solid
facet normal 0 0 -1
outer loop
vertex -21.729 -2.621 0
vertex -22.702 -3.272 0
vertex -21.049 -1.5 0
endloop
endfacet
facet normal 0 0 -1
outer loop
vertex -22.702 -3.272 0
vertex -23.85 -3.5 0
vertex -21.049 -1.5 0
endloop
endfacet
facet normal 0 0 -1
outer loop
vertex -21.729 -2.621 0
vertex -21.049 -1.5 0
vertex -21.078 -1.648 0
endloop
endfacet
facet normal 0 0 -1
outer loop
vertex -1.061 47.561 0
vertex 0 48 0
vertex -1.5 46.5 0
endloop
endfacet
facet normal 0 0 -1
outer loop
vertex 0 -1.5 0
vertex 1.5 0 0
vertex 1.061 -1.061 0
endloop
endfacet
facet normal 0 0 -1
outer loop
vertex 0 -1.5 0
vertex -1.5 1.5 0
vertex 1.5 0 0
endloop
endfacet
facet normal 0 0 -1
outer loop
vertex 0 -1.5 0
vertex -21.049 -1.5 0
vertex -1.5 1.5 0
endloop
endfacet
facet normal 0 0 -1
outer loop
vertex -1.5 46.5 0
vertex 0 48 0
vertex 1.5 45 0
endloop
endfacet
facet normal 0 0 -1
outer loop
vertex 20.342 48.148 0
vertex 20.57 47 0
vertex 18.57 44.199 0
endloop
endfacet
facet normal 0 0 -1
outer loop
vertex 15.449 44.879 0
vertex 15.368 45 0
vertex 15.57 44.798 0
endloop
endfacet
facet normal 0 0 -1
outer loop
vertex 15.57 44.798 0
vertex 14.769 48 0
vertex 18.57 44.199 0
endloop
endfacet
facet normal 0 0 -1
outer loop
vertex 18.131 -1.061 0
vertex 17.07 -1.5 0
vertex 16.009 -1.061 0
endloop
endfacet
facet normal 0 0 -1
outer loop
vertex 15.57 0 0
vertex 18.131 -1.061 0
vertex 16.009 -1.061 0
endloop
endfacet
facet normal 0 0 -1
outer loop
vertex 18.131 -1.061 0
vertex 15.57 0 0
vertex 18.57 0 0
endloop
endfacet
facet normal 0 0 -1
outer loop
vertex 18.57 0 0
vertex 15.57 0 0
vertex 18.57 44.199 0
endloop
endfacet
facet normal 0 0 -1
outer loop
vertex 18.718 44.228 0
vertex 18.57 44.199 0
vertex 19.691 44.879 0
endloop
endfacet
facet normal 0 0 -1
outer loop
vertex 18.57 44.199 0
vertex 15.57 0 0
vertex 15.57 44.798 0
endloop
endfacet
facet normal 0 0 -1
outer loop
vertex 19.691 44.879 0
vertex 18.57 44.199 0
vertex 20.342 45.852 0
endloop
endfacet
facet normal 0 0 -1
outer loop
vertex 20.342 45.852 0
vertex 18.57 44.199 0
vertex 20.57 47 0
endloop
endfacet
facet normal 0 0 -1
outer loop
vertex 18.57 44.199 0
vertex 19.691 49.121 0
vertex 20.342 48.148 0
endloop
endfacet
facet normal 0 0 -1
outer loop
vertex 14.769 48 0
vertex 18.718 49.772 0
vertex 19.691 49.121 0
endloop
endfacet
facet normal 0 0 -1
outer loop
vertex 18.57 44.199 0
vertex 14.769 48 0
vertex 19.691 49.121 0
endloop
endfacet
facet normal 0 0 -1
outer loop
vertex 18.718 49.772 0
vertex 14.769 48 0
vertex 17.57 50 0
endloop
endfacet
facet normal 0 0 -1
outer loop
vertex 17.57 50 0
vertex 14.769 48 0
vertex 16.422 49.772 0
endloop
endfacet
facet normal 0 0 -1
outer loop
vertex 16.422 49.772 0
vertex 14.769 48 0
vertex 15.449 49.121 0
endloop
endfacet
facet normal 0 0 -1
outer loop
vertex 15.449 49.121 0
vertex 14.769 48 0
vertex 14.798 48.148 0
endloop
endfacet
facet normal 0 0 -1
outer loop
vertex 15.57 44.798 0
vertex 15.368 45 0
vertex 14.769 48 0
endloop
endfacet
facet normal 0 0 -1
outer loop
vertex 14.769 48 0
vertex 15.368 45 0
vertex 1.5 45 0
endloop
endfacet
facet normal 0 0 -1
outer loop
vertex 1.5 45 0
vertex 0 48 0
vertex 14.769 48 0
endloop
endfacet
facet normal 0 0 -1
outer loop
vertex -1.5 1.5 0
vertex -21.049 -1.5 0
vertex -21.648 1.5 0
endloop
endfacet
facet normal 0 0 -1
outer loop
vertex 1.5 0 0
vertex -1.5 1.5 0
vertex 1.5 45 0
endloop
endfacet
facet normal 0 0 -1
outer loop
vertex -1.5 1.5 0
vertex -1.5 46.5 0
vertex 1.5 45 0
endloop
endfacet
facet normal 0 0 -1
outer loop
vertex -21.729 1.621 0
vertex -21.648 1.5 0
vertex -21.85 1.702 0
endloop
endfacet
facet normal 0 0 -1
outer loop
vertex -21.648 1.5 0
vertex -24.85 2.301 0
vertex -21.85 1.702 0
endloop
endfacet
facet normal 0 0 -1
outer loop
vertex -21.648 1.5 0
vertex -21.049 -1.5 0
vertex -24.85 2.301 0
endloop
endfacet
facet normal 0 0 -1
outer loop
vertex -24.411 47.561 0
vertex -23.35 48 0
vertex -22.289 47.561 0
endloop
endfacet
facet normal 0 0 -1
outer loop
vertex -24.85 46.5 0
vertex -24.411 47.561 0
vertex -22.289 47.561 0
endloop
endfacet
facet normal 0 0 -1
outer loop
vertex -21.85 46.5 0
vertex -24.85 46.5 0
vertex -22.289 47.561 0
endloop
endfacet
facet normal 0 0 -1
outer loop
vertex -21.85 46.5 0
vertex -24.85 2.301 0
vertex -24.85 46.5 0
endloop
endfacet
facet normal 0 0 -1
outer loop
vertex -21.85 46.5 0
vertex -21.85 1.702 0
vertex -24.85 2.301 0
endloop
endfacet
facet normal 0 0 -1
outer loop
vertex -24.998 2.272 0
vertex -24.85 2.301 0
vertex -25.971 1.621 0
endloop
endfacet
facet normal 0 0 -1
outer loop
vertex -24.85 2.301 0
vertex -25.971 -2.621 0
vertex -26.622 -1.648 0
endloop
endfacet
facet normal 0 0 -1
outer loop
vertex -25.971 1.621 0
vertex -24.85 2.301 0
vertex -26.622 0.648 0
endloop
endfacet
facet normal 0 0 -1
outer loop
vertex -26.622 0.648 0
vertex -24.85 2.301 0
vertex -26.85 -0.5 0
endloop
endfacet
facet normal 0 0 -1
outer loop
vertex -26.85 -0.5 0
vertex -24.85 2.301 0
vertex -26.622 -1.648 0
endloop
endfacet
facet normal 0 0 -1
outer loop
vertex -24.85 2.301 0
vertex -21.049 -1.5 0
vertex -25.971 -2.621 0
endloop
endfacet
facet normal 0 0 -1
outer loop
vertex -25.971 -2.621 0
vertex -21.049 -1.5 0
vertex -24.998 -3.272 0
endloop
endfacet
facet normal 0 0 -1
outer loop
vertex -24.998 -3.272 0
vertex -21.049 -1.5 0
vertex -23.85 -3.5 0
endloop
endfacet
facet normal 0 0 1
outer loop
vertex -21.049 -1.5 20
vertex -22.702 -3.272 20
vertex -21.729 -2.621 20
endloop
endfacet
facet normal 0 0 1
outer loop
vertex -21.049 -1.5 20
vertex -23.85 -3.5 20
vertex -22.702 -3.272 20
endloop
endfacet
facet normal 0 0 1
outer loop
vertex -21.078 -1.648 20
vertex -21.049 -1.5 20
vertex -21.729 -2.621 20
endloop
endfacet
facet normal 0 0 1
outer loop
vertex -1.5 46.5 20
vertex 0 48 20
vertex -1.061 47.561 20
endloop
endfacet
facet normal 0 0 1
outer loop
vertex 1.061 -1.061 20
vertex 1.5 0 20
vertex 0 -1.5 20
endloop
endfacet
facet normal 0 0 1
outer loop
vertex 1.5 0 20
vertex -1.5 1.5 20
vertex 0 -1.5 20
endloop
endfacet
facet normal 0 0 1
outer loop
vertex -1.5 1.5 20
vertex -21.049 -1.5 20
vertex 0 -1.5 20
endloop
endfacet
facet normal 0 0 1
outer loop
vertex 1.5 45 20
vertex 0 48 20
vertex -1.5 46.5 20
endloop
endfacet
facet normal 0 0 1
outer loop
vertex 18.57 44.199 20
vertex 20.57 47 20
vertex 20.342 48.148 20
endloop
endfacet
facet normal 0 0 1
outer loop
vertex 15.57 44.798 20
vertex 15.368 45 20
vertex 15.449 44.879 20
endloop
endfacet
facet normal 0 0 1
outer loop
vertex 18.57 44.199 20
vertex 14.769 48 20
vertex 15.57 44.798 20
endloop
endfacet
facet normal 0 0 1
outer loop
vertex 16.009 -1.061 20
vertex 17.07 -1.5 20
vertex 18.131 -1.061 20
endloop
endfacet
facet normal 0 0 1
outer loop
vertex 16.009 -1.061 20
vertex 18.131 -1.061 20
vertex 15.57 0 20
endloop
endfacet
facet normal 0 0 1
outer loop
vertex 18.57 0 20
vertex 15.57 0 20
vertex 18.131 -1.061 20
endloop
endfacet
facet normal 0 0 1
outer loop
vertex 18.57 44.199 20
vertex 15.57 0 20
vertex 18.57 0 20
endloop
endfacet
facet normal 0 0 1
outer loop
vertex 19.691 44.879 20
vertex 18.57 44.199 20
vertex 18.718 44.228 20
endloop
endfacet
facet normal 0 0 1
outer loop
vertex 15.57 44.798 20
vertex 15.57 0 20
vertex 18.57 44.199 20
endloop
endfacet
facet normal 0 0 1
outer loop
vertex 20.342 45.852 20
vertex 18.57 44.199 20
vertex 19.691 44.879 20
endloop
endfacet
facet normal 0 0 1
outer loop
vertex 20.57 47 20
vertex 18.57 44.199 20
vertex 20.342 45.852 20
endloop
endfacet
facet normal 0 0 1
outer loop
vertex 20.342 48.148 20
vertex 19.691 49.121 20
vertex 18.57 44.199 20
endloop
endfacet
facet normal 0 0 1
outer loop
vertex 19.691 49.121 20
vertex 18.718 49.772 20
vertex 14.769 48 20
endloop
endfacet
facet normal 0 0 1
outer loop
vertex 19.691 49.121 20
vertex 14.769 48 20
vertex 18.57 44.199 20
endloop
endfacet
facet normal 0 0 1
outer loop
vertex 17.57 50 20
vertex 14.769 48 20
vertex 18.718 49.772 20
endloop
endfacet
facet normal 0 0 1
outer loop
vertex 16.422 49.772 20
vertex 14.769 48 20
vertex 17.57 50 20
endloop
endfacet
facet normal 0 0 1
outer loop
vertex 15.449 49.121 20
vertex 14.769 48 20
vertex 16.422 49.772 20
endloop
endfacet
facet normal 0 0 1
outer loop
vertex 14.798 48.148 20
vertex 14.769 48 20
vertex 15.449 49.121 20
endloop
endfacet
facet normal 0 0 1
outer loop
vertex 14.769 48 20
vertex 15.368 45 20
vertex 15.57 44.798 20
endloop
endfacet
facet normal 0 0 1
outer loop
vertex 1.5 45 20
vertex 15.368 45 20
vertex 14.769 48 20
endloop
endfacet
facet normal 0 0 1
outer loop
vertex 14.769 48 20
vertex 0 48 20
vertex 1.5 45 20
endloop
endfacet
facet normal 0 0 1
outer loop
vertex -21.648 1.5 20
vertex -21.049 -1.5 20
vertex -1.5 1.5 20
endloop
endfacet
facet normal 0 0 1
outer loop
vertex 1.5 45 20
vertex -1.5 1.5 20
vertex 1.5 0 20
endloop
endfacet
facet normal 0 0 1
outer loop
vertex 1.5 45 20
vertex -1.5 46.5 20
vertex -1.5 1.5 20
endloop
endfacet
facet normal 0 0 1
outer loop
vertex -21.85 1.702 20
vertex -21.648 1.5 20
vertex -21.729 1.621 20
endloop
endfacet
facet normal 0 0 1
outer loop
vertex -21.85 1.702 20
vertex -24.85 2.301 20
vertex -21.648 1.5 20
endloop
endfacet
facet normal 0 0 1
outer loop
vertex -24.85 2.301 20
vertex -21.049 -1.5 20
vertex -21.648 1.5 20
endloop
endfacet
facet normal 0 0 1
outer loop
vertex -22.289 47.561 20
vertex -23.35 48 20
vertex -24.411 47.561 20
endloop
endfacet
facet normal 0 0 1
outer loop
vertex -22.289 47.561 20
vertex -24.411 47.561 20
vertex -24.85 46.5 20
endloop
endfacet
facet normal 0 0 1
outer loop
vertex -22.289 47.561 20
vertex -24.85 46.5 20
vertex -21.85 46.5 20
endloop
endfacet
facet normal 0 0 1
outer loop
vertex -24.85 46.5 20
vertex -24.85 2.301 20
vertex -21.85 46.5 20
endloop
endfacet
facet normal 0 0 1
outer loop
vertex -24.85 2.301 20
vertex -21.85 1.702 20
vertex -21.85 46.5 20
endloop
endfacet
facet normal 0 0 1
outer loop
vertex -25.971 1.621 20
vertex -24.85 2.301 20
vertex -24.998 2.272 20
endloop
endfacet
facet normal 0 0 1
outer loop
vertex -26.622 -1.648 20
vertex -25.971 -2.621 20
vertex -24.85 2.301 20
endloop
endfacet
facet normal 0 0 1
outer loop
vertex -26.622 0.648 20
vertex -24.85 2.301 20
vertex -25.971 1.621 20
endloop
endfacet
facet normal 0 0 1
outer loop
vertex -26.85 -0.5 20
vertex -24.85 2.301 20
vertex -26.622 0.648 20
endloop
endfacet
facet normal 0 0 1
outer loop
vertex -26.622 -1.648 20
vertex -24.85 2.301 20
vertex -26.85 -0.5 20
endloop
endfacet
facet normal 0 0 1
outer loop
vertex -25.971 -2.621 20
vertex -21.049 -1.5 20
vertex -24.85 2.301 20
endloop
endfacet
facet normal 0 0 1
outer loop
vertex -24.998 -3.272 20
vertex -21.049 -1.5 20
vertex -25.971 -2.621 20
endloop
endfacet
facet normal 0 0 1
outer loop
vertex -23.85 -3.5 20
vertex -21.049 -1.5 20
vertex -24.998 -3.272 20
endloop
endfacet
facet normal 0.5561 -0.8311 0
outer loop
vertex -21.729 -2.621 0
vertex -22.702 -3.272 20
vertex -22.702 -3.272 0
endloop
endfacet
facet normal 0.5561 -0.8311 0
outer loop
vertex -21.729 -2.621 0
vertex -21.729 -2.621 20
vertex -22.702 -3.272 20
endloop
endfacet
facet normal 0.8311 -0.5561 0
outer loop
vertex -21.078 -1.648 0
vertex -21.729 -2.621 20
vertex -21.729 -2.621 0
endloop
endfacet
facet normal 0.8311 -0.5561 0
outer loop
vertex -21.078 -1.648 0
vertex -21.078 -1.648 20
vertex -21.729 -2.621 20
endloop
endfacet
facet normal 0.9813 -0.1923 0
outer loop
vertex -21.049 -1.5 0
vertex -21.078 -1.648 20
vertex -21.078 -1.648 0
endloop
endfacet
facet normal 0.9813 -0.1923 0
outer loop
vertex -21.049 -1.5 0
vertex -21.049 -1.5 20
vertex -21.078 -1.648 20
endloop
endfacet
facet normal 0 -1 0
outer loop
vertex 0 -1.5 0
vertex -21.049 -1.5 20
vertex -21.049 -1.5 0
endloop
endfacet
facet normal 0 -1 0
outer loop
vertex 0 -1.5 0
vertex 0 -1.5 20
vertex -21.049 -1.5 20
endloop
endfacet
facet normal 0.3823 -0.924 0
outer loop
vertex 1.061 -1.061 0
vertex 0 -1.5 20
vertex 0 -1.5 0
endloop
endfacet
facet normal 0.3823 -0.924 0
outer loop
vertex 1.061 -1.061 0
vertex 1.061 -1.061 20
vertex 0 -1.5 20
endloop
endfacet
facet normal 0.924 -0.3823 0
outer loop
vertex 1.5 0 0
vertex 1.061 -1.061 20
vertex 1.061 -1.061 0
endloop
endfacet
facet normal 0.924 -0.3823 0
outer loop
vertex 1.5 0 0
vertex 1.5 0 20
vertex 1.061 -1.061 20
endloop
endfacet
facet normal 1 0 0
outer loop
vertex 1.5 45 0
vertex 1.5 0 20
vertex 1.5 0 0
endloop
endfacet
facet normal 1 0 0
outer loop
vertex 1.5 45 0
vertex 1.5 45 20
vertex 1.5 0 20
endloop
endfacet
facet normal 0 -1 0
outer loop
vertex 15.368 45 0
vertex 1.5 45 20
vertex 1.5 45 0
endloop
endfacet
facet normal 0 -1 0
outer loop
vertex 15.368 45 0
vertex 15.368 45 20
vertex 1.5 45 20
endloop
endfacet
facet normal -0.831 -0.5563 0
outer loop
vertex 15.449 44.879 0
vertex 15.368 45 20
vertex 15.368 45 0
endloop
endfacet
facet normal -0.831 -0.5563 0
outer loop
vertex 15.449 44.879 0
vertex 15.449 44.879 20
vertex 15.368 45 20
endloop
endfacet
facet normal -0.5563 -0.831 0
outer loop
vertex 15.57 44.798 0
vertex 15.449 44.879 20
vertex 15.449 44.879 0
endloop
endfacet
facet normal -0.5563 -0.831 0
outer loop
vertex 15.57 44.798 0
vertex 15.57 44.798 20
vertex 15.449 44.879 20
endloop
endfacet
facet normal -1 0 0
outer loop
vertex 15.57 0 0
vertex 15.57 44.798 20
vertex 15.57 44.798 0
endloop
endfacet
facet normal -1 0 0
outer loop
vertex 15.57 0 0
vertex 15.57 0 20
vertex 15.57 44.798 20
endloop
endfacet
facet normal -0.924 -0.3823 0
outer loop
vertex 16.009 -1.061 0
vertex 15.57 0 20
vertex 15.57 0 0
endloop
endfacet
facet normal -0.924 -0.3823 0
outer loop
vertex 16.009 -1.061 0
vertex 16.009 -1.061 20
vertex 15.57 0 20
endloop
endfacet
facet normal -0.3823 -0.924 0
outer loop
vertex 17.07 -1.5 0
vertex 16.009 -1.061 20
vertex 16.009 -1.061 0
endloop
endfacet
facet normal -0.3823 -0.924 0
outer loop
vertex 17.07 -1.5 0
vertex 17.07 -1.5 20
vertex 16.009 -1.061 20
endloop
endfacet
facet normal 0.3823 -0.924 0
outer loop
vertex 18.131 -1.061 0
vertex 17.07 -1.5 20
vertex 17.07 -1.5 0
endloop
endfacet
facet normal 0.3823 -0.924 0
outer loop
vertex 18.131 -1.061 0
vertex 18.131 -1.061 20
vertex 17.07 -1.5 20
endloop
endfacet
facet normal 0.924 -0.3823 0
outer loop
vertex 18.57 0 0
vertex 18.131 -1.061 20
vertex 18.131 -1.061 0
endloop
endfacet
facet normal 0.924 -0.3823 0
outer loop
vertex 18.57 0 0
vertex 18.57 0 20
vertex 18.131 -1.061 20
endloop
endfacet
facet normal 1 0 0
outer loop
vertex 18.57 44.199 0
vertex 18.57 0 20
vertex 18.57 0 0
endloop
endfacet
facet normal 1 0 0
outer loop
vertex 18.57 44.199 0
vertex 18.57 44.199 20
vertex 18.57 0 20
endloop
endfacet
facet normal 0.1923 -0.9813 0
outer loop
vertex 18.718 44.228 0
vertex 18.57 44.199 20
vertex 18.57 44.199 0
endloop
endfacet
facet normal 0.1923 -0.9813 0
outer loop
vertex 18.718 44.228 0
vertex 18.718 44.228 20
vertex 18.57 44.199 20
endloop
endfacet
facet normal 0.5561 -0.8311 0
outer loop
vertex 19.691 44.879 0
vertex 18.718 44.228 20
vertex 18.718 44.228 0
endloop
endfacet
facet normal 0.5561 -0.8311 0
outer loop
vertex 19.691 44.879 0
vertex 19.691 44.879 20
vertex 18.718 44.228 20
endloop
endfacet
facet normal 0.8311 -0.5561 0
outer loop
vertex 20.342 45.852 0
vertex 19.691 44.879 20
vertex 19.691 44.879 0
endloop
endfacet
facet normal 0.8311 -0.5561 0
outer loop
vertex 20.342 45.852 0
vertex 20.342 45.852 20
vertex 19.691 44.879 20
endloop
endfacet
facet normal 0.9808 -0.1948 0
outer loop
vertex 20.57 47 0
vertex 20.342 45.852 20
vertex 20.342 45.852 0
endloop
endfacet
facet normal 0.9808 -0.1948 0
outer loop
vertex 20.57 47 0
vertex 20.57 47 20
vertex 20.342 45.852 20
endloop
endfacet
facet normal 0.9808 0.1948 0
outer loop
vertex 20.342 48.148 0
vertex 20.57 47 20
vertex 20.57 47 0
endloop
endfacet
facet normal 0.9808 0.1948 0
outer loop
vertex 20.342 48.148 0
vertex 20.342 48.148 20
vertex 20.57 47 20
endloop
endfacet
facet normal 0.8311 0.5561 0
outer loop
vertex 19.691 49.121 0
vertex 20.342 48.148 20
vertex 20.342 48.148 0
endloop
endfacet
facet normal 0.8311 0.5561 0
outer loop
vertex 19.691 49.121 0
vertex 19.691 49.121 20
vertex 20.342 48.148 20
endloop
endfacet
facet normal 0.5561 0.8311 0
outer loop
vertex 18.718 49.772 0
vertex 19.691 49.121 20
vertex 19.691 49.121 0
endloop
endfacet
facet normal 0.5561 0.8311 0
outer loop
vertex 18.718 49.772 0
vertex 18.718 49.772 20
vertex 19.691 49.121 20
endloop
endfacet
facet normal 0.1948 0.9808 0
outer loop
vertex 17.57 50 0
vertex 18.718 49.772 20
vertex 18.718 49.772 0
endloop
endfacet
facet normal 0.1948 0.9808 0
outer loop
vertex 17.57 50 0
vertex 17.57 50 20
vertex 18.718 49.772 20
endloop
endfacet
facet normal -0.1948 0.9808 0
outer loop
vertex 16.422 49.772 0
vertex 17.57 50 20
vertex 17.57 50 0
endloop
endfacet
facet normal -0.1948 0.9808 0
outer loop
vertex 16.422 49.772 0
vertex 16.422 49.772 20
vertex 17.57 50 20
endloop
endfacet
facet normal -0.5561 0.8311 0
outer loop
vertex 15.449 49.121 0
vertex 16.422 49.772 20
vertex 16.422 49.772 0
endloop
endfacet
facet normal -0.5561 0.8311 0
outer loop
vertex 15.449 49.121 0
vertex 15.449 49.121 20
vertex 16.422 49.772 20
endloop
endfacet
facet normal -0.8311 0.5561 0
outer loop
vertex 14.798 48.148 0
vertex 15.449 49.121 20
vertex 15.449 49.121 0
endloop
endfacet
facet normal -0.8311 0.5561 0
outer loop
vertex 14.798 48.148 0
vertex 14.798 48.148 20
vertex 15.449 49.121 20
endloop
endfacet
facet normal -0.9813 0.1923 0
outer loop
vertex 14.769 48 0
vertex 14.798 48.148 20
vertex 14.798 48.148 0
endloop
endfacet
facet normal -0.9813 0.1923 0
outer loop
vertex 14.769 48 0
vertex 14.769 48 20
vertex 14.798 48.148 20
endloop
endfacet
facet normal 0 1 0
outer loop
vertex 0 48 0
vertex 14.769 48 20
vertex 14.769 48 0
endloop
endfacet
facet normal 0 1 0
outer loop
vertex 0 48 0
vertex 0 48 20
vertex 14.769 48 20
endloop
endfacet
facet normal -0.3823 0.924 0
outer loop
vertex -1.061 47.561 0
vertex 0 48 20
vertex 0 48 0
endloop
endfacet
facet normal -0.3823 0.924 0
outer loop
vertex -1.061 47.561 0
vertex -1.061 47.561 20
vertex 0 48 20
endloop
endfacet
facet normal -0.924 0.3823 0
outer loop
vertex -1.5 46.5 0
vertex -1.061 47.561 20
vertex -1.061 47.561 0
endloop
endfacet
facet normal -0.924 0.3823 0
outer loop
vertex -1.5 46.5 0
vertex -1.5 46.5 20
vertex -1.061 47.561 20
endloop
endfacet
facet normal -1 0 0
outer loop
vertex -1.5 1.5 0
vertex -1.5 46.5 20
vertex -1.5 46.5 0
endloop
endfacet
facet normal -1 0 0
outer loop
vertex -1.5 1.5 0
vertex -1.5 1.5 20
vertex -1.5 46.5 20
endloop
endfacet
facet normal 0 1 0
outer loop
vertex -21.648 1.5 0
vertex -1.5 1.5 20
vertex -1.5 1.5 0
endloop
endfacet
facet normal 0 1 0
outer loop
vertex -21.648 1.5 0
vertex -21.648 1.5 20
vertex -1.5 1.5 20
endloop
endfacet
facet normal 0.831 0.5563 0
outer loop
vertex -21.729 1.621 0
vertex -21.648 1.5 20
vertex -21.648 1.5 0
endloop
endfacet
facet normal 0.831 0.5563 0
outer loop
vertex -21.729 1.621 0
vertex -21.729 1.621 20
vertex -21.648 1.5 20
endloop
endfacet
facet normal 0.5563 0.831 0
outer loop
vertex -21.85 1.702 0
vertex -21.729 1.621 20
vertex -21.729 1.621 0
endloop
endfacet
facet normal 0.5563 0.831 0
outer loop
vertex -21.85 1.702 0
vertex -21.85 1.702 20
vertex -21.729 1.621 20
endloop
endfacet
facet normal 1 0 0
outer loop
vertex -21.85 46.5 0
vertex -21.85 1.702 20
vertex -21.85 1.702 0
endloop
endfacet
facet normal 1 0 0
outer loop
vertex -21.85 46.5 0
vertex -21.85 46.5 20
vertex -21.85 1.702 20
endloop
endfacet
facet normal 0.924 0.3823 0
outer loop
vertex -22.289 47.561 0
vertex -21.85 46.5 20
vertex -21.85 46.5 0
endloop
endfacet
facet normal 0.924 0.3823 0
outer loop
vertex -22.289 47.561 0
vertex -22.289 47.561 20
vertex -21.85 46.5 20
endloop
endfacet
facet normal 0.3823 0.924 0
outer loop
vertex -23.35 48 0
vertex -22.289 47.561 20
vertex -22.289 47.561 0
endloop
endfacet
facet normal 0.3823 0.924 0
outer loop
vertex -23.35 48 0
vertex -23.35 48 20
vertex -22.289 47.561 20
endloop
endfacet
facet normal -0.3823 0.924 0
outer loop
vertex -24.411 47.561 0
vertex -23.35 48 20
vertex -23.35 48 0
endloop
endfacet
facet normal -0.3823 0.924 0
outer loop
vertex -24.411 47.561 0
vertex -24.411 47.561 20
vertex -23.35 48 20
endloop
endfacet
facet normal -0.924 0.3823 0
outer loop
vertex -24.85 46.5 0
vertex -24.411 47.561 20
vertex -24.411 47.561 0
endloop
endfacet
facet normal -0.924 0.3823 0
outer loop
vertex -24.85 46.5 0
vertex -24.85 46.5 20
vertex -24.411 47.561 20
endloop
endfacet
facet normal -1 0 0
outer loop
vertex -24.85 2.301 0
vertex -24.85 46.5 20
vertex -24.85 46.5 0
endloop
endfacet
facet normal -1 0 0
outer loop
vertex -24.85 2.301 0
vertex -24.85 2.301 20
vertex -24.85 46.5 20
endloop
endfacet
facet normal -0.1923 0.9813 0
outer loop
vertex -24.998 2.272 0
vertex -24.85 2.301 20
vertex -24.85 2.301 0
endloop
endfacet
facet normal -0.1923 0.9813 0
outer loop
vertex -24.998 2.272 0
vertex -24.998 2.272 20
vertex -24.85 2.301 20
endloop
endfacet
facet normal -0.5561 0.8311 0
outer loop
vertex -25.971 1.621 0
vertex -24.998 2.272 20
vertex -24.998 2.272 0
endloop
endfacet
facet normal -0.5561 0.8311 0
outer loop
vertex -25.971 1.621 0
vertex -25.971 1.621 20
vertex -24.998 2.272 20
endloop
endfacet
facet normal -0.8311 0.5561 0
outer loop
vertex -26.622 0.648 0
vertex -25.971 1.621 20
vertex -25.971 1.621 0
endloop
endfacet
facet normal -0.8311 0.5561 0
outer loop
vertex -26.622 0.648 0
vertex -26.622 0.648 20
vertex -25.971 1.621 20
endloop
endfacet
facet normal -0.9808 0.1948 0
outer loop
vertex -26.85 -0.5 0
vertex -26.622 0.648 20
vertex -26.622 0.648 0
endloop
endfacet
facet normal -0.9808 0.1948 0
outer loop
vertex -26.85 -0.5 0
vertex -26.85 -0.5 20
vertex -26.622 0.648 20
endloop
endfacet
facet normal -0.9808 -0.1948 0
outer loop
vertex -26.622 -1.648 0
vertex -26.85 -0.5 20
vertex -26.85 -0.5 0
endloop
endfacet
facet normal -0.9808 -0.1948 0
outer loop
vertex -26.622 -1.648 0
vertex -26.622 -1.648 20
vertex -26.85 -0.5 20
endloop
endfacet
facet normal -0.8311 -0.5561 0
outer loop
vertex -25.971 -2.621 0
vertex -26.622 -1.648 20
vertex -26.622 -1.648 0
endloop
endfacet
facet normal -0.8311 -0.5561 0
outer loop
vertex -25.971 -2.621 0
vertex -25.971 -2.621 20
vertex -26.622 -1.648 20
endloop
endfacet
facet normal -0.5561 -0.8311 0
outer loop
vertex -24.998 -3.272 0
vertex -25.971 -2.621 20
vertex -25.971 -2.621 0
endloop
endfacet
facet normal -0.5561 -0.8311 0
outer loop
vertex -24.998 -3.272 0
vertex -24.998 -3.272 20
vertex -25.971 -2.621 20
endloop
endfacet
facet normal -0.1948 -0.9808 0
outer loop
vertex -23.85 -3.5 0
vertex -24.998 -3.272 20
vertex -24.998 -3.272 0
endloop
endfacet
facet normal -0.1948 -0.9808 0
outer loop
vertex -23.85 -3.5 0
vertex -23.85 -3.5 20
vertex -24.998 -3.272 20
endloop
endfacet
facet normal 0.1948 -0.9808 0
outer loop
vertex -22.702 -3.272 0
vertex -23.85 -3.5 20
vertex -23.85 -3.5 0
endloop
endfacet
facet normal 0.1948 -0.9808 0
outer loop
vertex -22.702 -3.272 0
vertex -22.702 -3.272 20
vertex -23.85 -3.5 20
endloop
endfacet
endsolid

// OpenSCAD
// file: ribbon.scad
module ribbon(points, thickness=1, closed=false) {
    p = closed ? concat(points, [points[0]]) : points;
    
    union() {
        for (i=[1:len(p)-1]) {
            hull() {
                translate(p[i-1]) 
                    if ($children==0)
                        circle(d=thickness, $fn=8);
                    else
                        children();
                translate(p[i]) 
                    if ($children==0)
                        circle(d=thickness, $fn=8);
                    else
                        children();
            }
        }
    }
}

pi = 3.1415926535897932;
function SIN(theta) = sin(theta * 180 / pi);
function COS(theta) = cos(theta * 180 / pi);
function TAN(theta) = tan(theta * 180 / pi);

//<skip>
color("red") linear_extrude(height=10)
 ribbon([for (theta=[0:0.1:2*pi]) [theta * 10 / (2*pi), SIN(theta) * 10 / (2*pi)]], thickness=3, closed=true);
color("blue") linear_extrude(height=10)
 ribbon([for (theta=[0:0.1:2*pi]) [theta * 10 / (2*pi), SIN(theta) * 10 / (2*pi)]], thickness=.1, closed=true);
ribbon([for (theta=[0:0.1:2*pi+.1]) [COS(theta)*10, SIN(3*theta) * 10]], thickness=.5);
//</skip>
    
// main file
use <ribbon.scad>;

//<params>
frontPanel = 13.32;
backPanel = 19.6;
offset = 45;
tolerance = 0.75;

width = 20;
thickness = 3;
//</params>

frontPanelAdj = frontPanel + tolerance + thickness;
backPanelAdj = backPanel + tolerance + thickness;
offsetAdj = offset + thickness/2;

profile = [ [-backPanelAdj, offsetAdj], 
            [-backPanelAdj, 0],
            [0,0],
            [0, offsetAdj],
            [frontPanelAdj, offsetAdj],
            [frontPanelAdj, 0] ];
            
linear_extrude(height=width) {
    ribbon(profile, thickness=thickness);           
    translate(profile[1]-[thickness,thickness]/6) circle(d=thickness*2, $fn=16);
    translate(profile[len(profile)-2]+[thickness,thickness]/6) circle(d=thickness*2, $fn=16);
}
